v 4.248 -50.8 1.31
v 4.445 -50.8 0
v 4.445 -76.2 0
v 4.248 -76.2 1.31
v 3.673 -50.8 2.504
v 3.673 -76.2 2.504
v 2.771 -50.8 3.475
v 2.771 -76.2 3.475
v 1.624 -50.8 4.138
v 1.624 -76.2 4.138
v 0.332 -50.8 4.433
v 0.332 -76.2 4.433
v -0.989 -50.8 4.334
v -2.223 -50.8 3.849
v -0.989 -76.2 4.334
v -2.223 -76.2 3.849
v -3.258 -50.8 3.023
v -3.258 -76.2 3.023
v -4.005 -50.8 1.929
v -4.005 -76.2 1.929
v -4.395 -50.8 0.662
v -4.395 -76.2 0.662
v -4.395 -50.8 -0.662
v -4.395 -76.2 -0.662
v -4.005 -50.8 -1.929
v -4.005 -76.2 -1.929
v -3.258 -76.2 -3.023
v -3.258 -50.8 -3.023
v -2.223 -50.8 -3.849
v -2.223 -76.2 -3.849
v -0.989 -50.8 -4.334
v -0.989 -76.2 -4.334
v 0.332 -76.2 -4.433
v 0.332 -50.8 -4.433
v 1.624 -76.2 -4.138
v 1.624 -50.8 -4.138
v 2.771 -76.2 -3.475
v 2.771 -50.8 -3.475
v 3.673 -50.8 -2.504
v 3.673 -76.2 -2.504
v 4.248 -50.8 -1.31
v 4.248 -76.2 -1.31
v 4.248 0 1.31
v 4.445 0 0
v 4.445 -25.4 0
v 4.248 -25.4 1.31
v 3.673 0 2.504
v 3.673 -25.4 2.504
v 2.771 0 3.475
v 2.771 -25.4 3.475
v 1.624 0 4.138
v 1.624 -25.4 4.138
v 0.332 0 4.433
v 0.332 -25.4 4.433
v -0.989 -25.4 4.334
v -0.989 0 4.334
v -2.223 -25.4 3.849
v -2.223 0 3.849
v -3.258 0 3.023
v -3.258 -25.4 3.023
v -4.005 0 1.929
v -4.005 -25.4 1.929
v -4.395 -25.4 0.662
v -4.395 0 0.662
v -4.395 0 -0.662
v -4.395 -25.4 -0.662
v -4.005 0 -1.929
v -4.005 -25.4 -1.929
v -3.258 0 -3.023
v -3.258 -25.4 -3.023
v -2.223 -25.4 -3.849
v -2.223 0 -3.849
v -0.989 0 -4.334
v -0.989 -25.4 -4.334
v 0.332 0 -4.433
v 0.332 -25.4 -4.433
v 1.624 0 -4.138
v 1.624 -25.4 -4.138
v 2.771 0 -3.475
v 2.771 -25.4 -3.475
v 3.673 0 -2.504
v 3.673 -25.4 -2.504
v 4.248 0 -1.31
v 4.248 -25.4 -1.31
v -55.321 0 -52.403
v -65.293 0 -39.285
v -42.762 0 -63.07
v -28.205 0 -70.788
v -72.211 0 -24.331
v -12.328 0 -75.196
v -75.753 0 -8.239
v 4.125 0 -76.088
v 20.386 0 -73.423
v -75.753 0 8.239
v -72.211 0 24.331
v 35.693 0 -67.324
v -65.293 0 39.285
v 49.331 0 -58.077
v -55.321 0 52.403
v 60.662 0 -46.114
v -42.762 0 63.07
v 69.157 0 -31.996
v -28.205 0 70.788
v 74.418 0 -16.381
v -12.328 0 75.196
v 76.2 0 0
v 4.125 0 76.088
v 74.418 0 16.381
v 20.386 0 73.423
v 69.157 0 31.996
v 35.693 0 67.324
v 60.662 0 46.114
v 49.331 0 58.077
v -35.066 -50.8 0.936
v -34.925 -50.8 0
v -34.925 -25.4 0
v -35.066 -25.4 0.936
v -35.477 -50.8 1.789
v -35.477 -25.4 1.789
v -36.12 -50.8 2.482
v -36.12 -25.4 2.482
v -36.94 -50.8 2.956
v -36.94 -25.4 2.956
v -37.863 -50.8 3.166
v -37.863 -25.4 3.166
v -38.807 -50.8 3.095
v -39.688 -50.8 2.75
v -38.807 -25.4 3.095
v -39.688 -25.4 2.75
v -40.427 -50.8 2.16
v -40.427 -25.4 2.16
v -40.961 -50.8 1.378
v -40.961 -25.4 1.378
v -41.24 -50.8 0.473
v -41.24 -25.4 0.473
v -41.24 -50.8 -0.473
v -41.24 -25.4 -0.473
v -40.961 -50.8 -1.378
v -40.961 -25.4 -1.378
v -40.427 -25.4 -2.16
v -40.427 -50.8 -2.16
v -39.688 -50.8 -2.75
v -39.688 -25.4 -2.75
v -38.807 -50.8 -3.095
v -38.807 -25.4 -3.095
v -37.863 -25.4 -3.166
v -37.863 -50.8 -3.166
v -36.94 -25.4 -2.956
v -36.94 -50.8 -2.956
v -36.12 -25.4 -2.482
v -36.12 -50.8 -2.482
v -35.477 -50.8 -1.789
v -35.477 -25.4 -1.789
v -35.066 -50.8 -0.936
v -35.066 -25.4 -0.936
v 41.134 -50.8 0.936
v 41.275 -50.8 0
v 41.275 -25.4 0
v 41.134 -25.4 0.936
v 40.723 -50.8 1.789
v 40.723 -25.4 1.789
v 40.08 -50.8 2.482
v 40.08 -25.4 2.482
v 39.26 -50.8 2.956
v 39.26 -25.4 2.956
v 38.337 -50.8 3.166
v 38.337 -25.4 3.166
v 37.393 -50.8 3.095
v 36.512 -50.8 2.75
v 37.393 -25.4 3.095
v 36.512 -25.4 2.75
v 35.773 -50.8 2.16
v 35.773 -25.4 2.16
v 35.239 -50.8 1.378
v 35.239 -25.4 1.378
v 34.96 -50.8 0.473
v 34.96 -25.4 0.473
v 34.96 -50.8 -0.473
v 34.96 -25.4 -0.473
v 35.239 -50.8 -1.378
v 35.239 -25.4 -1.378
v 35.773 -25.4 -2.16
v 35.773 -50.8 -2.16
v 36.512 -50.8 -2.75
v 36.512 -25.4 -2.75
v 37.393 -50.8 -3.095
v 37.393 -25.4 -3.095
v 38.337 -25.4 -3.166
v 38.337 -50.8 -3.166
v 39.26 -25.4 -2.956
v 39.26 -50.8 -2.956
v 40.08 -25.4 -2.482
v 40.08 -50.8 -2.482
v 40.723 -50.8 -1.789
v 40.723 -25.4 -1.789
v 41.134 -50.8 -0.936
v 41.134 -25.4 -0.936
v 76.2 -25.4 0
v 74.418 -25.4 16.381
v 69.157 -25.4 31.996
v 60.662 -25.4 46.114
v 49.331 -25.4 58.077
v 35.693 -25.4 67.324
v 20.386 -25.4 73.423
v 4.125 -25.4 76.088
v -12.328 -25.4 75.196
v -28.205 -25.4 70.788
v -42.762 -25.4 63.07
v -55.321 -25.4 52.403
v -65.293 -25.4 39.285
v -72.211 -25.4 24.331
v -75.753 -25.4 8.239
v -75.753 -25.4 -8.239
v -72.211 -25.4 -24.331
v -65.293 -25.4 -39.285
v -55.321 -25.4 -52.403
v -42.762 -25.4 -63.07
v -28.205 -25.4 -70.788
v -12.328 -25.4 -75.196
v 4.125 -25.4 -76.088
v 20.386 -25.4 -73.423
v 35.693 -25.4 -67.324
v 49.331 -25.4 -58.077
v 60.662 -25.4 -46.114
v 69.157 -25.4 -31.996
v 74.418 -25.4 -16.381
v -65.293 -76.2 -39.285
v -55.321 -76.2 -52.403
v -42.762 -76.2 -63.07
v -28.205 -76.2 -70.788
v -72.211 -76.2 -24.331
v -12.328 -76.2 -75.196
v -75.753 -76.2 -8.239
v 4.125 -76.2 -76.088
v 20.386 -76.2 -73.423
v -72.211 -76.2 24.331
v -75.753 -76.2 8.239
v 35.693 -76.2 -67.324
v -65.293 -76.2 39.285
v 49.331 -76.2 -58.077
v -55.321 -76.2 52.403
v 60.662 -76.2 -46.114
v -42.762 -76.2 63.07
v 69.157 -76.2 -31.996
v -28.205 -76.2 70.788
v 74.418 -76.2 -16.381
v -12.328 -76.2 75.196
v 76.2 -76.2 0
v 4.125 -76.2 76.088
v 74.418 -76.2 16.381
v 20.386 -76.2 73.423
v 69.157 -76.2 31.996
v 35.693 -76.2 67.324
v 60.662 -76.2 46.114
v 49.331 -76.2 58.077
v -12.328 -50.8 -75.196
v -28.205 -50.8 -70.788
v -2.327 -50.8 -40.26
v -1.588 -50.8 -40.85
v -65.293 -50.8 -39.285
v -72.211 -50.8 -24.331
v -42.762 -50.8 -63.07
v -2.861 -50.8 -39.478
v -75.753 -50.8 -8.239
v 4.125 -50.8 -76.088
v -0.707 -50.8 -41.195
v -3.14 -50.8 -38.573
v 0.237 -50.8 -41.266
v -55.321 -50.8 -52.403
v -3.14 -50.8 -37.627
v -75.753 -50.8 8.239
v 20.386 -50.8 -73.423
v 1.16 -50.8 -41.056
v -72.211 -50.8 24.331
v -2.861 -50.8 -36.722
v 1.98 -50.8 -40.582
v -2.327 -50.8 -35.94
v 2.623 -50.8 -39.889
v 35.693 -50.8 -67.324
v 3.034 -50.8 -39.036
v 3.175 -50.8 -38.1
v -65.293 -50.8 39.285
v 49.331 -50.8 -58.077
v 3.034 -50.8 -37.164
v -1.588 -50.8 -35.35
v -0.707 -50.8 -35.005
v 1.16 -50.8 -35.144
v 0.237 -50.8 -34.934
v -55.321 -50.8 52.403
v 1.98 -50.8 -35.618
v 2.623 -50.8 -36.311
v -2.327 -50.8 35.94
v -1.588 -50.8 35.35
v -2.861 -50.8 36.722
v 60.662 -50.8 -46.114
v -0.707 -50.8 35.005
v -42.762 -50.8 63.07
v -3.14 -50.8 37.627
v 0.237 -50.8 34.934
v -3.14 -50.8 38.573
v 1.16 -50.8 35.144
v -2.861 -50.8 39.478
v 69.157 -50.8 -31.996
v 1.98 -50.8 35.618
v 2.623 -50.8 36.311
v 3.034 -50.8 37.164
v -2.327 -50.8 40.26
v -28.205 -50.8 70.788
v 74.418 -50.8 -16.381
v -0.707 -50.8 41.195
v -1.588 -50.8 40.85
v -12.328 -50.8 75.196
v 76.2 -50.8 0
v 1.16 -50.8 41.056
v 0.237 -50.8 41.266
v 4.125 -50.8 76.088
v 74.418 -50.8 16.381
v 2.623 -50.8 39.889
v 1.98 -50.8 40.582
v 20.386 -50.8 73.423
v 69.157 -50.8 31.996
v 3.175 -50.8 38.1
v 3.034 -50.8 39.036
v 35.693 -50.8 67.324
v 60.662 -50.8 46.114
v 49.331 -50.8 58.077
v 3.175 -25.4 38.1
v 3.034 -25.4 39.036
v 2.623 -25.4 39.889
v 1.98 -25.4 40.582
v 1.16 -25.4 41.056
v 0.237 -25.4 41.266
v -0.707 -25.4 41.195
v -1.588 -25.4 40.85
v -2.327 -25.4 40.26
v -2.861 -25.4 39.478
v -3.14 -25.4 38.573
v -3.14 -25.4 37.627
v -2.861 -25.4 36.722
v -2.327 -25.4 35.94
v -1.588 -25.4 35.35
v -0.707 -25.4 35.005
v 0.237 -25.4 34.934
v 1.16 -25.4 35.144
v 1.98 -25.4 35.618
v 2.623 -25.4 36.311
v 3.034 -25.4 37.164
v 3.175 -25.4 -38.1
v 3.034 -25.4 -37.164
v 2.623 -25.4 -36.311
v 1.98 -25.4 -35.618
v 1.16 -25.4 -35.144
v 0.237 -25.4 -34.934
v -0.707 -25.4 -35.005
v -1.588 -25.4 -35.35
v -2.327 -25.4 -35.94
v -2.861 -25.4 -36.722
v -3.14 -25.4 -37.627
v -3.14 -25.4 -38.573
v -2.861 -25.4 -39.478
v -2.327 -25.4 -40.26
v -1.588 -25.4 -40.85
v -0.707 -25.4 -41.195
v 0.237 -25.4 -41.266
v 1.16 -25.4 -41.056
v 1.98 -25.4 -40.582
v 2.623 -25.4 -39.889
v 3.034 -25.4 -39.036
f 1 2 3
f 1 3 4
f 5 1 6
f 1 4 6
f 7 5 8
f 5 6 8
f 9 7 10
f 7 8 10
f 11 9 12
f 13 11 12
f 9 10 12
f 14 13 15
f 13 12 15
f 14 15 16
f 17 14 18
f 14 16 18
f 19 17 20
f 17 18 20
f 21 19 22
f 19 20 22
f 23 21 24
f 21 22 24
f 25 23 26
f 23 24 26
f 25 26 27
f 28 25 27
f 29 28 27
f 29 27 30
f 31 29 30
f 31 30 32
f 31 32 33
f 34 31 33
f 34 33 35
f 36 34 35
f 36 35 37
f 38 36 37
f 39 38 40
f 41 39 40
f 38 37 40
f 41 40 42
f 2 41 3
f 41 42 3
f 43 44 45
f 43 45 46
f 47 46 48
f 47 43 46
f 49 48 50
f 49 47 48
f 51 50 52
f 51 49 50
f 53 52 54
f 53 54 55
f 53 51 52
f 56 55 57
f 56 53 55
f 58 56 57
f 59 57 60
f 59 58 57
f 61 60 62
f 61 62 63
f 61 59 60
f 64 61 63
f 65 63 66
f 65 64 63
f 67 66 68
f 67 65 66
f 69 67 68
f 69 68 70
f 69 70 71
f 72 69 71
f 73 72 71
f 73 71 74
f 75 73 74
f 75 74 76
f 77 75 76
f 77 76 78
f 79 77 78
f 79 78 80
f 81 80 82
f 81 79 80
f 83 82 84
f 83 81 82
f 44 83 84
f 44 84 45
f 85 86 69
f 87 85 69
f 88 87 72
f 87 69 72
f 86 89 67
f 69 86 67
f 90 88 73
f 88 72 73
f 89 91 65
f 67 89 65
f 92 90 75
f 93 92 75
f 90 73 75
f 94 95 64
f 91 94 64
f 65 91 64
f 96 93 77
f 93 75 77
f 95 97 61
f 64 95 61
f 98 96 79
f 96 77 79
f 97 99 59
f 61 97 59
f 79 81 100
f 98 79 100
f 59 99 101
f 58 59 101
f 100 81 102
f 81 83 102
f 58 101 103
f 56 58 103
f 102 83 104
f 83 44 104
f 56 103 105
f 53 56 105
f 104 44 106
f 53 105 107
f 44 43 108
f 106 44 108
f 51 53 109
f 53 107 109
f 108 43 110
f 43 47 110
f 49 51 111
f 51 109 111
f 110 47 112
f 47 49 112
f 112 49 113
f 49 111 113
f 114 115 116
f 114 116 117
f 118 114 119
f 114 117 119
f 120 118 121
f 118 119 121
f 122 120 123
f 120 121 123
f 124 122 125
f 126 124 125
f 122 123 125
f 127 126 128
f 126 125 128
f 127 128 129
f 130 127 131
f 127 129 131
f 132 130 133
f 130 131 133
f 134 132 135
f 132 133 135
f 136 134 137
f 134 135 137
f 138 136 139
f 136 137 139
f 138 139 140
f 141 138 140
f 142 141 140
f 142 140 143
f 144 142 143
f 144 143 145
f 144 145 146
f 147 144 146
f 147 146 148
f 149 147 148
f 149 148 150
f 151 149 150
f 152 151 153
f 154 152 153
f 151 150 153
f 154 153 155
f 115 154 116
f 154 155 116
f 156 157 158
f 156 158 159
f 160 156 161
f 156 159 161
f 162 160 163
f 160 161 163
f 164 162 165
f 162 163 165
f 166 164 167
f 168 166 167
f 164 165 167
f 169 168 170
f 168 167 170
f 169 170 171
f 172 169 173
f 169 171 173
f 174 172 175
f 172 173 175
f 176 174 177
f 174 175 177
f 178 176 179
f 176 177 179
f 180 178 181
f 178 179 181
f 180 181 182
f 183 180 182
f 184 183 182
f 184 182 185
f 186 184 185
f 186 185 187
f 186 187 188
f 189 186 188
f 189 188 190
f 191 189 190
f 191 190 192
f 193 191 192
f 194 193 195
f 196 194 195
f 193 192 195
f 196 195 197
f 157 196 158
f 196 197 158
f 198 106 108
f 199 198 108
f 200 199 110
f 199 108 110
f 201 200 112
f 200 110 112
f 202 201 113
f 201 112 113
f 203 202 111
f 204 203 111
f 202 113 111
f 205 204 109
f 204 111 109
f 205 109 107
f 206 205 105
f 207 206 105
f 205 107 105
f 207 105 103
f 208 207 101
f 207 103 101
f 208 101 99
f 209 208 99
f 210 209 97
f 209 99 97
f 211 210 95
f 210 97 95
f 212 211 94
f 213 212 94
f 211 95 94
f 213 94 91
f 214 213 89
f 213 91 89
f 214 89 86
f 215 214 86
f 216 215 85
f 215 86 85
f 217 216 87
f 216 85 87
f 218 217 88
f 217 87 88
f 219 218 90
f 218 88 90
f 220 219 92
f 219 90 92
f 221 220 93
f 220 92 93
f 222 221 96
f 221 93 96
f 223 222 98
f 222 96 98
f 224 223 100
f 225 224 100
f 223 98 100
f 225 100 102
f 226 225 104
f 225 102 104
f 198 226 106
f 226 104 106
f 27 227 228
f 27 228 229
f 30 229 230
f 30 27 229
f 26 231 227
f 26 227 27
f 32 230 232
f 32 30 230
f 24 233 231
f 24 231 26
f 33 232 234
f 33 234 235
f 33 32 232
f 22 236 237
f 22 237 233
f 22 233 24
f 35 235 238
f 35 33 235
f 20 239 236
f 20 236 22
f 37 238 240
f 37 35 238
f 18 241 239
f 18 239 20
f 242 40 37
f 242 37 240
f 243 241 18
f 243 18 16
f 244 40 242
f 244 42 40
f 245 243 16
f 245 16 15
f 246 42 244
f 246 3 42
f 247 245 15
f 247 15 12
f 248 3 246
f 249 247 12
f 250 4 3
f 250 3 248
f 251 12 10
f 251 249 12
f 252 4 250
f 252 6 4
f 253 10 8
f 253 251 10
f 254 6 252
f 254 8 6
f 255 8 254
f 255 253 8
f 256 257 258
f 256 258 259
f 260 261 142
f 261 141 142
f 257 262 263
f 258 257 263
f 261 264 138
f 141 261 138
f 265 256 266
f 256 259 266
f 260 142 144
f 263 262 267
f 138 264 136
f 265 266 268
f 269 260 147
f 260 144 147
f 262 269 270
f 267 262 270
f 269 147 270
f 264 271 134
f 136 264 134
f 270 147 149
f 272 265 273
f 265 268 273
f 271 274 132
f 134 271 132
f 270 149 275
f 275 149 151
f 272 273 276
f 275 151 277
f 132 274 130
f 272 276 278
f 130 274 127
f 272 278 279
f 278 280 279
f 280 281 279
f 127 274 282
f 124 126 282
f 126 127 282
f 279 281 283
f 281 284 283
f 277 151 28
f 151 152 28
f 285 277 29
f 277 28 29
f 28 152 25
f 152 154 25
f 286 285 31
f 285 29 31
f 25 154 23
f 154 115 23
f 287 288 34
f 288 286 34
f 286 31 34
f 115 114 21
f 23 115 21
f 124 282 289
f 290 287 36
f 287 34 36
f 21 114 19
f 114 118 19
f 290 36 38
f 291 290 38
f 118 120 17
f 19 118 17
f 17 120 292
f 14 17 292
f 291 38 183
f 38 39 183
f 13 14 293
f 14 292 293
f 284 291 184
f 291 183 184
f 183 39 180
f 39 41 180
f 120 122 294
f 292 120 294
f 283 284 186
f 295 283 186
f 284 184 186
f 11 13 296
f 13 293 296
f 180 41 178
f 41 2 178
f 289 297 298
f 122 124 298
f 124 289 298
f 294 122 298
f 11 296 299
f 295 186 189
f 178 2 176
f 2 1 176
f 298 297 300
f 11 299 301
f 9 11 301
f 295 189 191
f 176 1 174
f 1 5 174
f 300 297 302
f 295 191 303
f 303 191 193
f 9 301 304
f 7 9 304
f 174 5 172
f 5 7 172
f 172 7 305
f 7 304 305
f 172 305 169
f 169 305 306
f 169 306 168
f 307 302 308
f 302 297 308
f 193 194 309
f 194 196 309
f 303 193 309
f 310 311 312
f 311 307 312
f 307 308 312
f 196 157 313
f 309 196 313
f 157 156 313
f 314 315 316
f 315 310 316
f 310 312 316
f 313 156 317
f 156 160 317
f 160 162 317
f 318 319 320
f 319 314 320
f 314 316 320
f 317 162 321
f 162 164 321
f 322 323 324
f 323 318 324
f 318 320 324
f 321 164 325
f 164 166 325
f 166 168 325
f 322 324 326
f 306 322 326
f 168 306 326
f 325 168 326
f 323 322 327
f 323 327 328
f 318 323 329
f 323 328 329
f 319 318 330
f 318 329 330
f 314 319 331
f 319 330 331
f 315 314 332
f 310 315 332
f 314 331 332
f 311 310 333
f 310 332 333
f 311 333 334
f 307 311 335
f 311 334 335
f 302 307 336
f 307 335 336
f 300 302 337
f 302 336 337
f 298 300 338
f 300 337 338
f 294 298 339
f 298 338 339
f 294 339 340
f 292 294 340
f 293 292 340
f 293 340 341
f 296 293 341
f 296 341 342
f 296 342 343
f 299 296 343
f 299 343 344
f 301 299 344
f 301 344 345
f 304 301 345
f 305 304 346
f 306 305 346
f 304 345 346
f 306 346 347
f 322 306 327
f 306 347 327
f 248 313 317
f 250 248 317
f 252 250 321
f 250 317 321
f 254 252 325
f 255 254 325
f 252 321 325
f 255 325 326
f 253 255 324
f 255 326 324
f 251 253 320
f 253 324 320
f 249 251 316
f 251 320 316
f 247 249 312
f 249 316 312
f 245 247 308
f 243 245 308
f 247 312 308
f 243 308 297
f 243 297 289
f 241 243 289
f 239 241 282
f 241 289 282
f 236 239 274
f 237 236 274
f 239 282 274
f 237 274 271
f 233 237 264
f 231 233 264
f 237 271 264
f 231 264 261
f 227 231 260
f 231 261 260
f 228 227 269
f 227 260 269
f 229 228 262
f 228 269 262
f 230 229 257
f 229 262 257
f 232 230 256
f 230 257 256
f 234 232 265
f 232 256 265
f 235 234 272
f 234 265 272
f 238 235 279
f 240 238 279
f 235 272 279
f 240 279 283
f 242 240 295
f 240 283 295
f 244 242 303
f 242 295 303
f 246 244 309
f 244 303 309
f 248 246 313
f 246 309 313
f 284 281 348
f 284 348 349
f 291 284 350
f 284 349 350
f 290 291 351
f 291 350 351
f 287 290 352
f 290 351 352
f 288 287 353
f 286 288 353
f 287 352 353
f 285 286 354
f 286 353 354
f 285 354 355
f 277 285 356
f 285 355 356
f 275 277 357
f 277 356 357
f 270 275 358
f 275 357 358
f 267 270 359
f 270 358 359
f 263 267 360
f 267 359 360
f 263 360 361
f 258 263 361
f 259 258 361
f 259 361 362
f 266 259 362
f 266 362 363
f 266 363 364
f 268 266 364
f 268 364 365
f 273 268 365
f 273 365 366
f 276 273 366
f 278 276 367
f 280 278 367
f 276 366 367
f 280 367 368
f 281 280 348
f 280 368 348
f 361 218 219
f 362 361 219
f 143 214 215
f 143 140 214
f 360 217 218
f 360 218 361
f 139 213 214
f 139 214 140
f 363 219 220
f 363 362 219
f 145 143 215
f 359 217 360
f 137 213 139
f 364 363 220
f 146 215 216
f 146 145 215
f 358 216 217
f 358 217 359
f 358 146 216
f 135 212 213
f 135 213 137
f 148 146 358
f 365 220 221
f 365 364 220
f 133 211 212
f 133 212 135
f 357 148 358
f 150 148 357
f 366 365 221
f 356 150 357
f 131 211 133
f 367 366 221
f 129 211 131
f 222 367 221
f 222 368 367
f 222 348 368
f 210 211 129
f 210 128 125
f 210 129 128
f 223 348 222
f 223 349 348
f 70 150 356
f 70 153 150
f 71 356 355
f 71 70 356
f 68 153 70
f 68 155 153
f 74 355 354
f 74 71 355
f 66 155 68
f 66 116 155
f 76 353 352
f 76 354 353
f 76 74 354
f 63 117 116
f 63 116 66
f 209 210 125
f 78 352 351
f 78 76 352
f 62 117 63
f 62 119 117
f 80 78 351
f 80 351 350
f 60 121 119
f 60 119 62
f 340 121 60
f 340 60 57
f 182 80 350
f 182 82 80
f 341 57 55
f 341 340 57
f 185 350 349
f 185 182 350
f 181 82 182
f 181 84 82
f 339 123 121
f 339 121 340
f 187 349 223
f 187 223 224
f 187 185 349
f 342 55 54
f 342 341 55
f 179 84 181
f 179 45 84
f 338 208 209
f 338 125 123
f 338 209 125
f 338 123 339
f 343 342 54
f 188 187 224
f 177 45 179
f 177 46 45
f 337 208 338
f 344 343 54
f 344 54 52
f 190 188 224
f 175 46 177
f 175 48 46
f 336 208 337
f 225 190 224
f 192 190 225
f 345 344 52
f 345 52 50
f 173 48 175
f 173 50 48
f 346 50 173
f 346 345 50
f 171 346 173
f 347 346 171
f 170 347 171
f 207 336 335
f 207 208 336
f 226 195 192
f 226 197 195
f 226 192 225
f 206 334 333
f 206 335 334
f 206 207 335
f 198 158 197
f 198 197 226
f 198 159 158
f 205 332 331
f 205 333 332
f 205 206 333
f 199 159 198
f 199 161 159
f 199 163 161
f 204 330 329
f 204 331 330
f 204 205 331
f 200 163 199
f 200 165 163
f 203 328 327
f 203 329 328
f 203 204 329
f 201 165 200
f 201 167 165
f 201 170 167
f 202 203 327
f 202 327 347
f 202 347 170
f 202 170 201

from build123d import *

# Parameters (mm, degrees)
F0_R     = 76.2
F2_DEPTH = 25.4
F1_R     = 4.445
F3_DEPTH = 25.4
F4_R     = 3.175
F5_DEPTH = 25.4
F6_R     = 76.2
F7_DEPTH = 25.4
F8_R     = 4.445
F9_DEPTH = 25.4


with BuildPart() as f2:
    # F0 (on Front) → F2 (new body)
    with BuildSketch(Plane.XZ):
        Circle(F0_R)
    extrude(amount=F2_DEPTH)

    # F1 (on face) → F3 (cut)
    with BuildSketch(Plane.XZ):
        Circle(F1_R)
    extrude(amount=F3_DEPTH, mode=Mode.SUBTRACT)

    # F4 (on face) → F5 (join)
    with BuildSketch(Plane.XZ.offset(25.4)):
        with Locations((38.1, 0)):
            Circle(F4_R)
        with Locations((0, 38.1)):
            Circle(F4_R)
        with Locations((-38.1, 0)):
            Circle(F4_R)
        with Locations((0, -38.1)):
            Circle(F4_R)
    extrude(amount=F5_DEPTH)

    # F6 (on face) → F7 (join)
    with BuildSketch(Plane.XZ.offset(50.8)):
        Circle(F6_R)
    extrude(amount=F7_DEPTH)

    # F8 (on face) → F9 (cut)
    with BuildSketch(Plane.XZ.offset(76.2)):
        Circle(F8_R)
    extrude(amount=-F9_DEPTH, mode=Mode.SUBTRACT)


solid = f2.part
